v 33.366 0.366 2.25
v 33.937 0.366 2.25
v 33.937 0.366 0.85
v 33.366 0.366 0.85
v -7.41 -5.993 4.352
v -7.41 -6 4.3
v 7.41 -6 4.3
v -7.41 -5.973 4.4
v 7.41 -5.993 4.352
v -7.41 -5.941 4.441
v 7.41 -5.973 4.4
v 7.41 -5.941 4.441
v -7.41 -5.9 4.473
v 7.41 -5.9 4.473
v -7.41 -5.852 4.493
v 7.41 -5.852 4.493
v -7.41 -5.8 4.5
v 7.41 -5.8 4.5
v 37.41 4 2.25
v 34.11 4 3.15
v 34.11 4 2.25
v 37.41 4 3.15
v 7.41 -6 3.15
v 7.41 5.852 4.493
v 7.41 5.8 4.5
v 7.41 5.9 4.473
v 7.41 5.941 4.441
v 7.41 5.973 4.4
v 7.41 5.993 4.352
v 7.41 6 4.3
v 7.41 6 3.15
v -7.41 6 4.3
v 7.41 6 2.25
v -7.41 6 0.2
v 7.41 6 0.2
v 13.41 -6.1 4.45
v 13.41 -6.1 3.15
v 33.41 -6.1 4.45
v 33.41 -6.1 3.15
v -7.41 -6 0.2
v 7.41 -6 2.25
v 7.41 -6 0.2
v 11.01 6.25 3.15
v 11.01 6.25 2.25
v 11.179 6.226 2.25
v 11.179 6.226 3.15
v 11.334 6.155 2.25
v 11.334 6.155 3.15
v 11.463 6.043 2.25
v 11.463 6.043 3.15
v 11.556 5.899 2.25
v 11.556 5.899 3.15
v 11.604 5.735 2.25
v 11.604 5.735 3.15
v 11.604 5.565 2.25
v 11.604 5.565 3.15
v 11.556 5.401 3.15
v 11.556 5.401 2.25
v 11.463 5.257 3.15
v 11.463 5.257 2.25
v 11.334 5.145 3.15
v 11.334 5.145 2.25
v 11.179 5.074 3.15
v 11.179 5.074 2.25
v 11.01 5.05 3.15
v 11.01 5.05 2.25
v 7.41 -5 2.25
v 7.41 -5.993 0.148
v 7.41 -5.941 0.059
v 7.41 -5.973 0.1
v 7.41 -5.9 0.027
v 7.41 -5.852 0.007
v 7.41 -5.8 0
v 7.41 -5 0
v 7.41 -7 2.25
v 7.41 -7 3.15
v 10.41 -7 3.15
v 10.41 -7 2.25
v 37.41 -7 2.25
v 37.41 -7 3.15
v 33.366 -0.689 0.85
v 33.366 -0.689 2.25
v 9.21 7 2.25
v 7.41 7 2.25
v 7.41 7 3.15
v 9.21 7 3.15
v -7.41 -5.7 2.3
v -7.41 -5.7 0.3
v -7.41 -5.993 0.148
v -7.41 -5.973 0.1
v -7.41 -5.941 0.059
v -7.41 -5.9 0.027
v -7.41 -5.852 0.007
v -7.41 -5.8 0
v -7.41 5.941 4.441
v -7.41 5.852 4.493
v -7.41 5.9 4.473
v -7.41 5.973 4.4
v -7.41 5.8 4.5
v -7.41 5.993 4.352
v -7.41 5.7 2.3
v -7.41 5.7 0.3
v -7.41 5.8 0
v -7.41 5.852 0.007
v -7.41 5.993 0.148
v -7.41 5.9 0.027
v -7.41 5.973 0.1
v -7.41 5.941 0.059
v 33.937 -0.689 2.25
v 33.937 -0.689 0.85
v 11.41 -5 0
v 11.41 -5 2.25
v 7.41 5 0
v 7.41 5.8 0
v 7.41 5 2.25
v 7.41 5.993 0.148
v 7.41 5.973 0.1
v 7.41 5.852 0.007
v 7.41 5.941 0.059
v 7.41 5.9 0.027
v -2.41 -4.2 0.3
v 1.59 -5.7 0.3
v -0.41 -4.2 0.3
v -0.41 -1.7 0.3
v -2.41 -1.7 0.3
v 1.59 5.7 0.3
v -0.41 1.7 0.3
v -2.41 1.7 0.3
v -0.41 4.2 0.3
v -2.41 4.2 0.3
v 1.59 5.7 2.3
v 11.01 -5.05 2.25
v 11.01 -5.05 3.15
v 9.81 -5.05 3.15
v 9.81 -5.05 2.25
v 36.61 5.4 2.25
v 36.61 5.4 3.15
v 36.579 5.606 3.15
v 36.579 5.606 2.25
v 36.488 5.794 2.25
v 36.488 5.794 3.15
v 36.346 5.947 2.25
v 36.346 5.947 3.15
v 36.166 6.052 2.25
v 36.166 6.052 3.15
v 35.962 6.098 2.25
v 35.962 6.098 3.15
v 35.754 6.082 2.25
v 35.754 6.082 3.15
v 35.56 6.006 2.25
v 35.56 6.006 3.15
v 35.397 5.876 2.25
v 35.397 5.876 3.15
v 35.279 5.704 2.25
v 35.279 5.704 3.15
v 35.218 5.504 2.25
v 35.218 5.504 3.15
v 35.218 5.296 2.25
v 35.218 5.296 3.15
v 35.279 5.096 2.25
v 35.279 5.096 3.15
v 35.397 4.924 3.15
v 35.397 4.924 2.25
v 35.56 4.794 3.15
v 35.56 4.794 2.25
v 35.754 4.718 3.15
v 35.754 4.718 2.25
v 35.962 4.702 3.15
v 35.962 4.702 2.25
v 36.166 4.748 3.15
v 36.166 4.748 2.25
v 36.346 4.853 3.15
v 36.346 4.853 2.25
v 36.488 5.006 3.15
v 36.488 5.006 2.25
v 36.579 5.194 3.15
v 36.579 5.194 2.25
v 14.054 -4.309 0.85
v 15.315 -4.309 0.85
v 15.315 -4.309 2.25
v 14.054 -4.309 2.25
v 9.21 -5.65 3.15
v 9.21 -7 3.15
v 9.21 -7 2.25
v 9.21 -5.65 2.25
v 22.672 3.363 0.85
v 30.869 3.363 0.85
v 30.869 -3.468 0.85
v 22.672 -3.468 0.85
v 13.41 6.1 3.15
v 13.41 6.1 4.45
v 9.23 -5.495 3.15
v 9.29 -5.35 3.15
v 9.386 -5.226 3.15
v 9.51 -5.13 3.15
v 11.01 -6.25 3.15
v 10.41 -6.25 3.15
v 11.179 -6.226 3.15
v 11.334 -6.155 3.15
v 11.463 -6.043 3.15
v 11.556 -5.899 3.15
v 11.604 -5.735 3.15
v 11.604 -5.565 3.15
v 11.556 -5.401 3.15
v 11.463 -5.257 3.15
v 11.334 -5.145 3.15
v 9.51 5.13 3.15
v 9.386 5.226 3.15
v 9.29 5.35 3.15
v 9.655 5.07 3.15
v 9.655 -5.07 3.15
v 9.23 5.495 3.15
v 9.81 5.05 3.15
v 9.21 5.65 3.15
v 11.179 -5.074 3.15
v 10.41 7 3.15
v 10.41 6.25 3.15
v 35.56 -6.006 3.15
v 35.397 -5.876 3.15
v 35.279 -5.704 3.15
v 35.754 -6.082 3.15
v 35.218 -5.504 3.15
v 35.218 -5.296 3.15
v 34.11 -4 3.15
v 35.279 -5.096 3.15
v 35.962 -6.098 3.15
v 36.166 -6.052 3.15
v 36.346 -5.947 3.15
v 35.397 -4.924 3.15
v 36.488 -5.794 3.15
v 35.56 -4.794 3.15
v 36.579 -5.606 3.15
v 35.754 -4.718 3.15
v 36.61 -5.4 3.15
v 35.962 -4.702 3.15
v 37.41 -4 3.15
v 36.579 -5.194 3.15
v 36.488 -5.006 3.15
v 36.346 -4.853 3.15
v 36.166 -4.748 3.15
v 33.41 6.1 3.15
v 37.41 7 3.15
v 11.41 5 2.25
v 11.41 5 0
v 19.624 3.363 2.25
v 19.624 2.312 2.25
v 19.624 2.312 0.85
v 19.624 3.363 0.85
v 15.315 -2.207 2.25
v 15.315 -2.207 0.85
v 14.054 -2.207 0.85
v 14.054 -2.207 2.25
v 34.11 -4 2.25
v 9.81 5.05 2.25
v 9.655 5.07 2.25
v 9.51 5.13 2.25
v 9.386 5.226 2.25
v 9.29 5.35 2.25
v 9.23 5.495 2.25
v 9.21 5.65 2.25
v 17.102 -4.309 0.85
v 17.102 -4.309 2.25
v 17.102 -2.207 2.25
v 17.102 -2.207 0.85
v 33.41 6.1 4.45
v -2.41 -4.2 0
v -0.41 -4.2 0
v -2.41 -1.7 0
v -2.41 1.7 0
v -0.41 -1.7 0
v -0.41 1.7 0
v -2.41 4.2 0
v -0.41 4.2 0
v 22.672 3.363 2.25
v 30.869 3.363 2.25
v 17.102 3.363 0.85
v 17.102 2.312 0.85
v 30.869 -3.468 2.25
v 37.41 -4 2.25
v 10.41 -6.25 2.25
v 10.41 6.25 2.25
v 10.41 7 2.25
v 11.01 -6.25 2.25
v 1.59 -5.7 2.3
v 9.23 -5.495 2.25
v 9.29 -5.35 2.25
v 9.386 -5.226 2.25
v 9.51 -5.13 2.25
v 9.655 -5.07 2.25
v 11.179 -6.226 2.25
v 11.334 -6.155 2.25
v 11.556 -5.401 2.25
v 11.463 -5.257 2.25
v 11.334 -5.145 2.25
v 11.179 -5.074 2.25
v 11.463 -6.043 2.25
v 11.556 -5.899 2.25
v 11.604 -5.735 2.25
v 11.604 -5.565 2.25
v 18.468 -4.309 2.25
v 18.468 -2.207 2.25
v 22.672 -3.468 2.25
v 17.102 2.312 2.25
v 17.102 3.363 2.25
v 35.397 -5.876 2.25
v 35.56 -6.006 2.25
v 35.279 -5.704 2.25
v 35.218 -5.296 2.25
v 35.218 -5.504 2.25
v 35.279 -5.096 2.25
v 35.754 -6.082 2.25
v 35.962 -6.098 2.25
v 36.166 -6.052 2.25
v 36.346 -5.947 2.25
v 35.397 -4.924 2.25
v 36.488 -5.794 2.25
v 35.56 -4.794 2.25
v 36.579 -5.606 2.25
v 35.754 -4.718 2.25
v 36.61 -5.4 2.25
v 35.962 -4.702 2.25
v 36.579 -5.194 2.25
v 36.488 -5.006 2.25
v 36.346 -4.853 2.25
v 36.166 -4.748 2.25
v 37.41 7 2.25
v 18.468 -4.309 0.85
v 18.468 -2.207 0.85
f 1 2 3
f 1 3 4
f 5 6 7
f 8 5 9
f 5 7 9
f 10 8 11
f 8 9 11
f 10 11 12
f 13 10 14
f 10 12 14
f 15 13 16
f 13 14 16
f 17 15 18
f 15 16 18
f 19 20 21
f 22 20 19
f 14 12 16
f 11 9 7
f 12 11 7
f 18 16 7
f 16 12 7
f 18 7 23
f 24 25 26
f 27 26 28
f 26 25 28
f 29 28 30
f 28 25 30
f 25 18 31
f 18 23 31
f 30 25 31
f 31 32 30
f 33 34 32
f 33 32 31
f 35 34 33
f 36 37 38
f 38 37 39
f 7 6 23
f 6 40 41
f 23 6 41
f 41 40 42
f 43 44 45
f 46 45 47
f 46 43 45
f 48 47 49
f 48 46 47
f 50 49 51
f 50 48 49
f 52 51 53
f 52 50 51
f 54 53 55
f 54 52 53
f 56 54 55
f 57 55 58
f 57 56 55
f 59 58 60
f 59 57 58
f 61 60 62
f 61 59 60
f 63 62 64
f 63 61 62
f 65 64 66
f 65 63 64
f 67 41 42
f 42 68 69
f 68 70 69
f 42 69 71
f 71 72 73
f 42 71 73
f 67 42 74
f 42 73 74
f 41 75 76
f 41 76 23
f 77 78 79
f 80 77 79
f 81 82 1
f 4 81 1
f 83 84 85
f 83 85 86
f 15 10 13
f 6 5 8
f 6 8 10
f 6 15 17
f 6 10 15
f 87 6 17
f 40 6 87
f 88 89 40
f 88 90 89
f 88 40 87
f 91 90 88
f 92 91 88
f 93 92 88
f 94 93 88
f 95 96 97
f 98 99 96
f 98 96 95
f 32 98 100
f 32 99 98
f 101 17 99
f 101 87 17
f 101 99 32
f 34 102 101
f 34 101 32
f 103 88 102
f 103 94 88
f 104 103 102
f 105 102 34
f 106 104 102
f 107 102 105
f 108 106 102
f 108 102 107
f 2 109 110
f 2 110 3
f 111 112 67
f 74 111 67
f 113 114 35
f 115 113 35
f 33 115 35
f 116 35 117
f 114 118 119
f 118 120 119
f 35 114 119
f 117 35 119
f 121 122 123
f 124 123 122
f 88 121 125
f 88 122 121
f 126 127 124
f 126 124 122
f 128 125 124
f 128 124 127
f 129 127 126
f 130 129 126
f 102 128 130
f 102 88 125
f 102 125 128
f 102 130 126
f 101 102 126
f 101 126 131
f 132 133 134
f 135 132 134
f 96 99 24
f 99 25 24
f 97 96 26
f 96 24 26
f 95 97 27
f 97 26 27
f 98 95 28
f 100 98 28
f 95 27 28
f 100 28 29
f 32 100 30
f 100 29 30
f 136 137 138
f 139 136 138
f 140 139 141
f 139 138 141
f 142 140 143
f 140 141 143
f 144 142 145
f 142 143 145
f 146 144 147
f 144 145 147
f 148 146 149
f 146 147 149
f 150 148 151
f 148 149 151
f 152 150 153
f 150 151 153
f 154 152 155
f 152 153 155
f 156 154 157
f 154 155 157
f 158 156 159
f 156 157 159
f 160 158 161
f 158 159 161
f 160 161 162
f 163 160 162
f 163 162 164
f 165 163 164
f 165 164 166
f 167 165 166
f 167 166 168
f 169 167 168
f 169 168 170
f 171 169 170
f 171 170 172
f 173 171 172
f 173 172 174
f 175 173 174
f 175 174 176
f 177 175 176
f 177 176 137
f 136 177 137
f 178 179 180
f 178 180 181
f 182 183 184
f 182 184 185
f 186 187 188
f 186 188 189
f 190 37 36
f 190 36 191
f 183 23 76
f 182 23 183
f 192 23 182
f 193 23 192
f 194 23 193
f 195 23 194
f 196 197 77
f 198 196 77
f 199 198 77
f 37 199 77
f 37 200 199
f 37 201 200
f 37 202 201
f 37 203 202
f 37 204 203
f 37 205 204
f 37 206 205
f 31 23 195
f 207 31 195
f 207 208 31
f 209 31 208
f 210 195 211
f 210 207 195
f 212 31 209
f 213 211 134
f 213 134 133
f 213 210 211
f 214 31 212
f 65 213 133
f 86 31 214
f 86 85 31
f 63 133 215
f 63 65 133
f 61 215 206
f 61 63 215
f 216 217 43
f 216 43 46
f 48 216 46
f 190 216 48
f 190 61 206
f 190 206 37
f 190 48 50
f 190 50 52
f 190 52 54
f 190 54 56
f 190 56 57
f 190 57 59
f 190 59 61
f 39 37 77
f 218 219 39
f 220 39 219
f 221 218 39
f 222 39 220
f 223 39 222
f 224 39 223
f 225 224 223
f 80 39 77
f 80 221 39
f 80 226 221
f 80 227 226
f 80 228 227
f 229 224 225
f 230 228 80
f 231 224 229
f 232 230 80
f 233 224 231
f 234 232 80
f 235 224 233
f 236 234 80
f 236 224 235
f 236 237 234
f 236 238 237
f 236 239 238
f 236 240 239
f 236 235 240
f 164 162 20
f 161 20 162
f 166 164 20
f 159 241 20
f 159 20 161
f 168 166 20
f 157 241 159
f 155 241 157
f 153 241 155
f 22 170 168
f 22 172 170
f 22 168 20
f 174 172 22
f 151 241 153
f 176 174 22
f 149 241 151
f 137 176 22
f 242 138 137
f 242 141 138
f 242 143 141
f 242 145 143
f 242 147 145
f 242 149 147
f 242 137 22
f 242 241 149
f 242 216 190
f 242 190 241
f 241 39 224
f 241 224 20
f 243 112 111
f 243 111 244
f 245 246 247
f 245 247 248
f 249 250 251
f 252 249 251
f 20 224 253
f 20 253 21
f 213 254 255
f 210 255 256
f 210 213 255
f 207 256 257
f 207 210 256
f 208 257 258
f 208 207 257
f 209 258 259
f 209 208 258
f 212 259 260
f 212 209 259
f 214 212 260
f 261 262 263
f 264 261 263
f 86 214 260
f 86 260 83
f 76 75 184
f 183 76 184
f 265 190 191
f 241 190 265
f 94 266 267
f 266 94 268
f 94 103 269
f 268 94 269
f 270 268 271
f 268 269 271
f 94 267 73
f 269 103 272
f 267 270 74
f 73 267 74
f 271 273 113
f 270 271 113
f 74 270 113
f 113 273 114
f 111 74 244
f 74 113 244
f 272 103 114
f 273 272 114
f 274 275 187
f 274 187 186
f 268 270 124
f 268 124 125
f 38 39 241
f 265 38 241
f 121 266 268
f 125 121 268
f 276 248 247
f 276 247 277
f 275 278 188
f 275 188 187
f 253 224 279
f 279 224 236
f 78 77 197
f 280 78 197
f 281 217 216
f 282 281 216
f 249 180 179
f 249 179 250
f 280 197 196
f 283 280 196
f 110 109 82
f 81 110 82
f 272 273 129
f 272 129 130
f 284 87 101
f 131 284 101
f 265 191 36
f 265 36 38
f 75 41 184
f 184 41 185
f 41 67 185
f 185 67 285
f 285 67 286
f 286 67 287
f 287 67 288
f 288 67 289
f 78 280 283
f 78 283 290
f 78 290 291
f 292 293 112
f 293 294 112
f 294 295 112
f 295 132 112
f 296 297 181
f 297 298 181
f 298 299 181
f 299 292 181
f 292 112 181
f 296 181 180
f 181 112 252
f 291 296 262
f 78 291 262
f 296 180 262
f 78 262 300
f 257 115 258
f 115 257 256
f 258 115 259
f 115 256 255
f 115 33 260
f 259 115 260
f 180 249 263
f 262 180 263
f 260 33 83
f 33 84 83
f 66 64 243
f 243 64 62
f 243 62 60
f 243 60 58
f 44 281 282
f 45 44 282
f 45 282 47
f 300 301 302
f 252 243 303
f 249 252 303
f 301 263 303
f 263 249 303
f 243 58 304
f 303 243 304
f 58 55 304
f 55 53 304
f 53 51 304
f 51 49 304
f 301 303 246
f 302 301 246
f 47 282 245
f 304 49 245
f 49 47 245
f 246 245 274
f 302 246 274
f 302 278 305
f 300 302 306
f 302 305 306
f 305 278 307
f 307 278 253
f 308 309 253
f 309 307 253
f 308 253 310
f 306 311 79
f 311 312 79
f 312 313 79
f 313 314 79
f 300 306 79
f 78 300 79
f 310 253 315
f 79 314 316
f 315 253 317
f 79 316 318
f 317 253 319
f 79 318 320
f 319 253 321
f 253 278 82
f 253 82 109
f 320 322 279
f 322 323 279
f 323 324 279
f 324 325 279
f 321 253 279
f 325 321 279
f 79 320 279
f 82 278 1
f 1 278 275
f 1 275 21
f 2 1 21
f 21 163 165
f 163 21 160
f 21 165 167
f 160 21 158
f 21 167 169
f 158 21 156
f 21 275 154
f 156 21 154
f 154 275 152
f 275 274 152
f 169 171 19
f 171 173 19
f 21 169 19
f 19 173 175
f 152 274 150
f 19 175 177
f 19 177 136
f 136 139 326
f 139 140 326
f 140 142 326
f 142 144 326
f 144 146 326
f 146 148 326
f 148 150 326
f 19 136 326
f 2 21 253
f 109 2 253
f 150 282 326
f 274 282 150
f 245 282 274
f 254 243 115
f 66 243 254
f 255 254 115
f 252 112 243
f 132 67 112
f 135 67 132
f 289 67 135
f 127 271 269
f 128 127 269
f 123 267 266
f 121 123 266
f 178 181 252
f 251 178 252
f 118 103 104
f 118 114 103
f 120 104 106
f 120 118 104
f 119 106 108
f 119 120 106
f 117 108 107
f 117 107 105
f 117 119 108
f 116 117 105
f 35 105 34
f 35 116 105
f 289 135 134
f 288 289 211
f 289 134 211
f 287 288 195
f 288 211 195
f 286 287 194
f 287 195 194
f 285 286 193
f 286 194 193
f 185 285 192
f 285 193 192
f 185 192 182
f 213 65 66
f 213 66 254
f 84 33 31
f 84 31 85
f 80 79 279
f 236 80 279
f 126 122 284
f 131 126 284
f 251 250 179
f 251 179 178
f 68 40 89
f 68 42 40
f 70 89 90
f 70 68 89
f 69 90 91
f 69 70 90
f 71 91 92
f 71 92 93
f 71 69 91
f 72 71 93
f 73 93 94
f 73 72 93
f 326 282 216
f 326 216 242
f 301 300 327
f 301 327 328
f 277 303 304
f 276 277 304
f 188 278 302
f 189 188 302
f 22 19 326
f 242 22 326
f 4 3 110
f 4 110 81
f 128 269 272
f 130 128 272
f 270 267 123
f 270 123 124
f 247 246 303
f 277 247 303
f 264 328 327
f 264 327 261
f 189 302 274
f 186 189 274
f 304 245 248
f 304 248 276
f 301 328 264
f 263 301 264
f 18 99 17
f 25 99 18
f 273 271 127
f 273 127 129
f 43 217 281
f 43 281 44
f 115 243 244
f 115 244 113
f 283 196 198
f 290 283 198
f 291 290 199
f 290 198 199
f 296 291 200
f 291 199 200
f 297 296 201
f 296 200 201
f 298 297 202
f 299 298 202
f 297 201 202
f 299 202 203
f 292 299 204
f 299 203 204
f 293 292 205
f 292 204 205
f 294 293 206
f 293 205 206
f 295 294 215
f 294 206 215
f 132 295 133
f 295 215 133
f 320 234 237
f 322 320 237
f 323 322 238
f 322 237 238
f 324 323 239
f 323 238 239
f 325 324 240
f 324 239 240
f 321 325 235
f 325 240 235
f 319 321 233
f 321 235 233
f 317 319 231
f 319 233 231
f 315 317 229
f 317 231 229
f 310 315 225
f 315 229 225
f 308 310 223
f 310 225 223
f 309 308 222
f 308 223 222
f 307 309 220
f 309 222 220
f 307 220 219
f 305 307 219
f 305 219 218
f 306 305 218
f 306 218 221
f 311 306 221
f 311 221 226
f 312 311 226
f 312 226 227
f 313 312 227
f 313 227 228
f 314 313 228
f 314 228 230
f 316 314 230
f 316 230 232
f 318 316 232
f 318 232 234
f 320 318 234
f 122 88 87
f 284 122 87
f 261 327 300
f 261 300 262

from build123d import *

# Parameters (mm, degrees)
ESQUISSE1_W             = 14.82
ESQUISSE1_H             = 12
BOSS_EXTRU_1_DEPTH      = 4.5
ESQUISSE2_W             = 2
ESQUISSE2_H             = 11.4
ENL_V_MAT_EXTRU_1_DEPTH = 9
CONG_1_R                = 0.2
ESQUISSE3_W             = 30
ESQUISSE3_H             = 14
BOSS_EXTRU_2_DEPTH      = 0.9
ENL_V_MAT_EXTRU_2_REACH = 6.5
ESQUISSE4_W             = 2
ESQUISSE4_H             = 2.5
ESQUISSE5_R             = 0.7
ESQUISSE5_W             = 3.3
ESQUISSE5_H             = 8
ENL_V_MAT_EXTRU_3_DEPTH = 4.15
ESQUISSE6_W             = 20
ESQUISSE6_H             = 12.2
BOSS_EXTRU_3_DEPTH      = 1.3
ESQUISSE7_W             = 8.197434371
ESQUISSE7_H             = 6.831195309
ESQUISSE7_W_2           = 1.366239062
ESQUISSE7_H_2           = 2.101906249
ESQUISSE7_W_3           = 1.261143749
ESQUISSE7_W_4           = 2.522287499
ESQUISSE7_H_3           = 1.050953124
ESQUISSE7_W_5           = 0.570374351
ESQUISSE7_H_4           = 1.05519255
BOSS_EXTRU_4_DEPTH      = 1.4
ESQUISSE8_W             = 4
ESQUISSE8_H             = 10
BOSS_EXTRU_5_DEPTH      = 2.25
ESQUISSE9_W             = 1.2
ESQUISSE9_H             = 1.35
ENL_V_MAT_EXTRU_4_DEPTH = 4.15


with BuildPart() as part:
    # Esquisse1 → Boss.-Extru.1 (new body)
    with BuildSketch(Plane.XY):
        Rectangle(ESQUISSE1_W, ESQUISSE1_H)
    extrude(amount=BOSS_EXTRU_1_DEPTH)

    # Esquisse2 → Enlèv. mat.-Extru.1 (cut)
    with BuildSketch(Plane.ZY.offset(7.41)):
        with Locations((1.3, 0)):
            Rectangle(ESQUISSE2_W, ESQUISSE2_H)
    extrude(amount=-ENL_V_MAT_EXTRU_1_DEPTH, mode=Mode.SUBTRACT)

    # Congé1
    cong_1_edges = [part.edges().sort_by_distance(p)[0] for p in [
        (0, -6, 4.5),
        (0, -6, 0),
        (0, 6, 0),
        (0, 6, 4.5),
    ]]
    fillet(cong_1_edges, radius=CONG_1_R)

    # Esquisse3 → Boss.-Extru.2 (add)
    with BuildSketch(Plane.XY.offset(2.25)):
        with Locations((22.41, 0)):
            Rectangle(ESQUISSE3_W, ESQUISSE3_H)
    extrude(amount=BOSS_EXTRU_2_DEPTH)

    # Esquisse4 → Enlèv. mat.-Extru.2 (cut, up to next)
    with BuildSketch(Plane(origin=(0, 0, 0), x_dir=(-1, 0, 0), z_dir=(0, 0, -1)), mode=Mode.PRIVATE) as enl_v_mat_extru_2_sk1:
        with Locations((1.41, 2.95)):
            Rectangle(ESQUISSE4_W, ESQUISSE4_H)
    enl_v_mat_extru_2_tool1 = extrude(enl_v_mat_extru_2_sk1.sketch, amount=-ENL_V_MAT_EXTRU_2_REACH, mode=Mode.PRIVATE) & part.part
    add(enl_v_mat_extru_2_tool1.solids().sort_by_distance((-1.41, 2.95, 0))[0], mode=Mode.SUBTRACT)
    # Esquisse4 → Enlèv. mat.-Extru.2 (cut, up to next)
    with BuildSketch(Plane(origin=(0, 0, 0), x_dir=(-1, 0, 0), z_dir=(0, 0, -1)), mode=Mode.PRIVATE) as enl_v_mat_extru_2_sk2:
        with Locations((1.41, -2.95)):
            Rectangle(ESQUISSE4_W, ESQUISSE4_H)
    enl_v_mat_extru_2_tool2 = extrude(enl_v_mat_extru_2_sk2.sketch, amount=-ENL_V_MAT_EXTRU_2_REACH, mode=Mode.PRIVATE) & part.part
    add(enl_v_mat_extru_2_tool2.solids().sort_by_distance((-1.41, -2.95, 0))[0], mode=Mode.SUBTRACT)

    # Esquisse5 → Enlèv. mat.-Extru.3 (cut, through all)
    with BuildSketch(Plane.XY.offset(3.15)):
        with Locations((35.91, 5.4)):
            Circle(ESQUISSE5_R)
        with Locations((35.91, -5.4)):
            Circle(ESQUISSE5_R)
        with Locations((35.76, 0)):
            Rectangle(ESQUISSE5_W, ESQUISSE5_H)
        with BuildLine():
            Line((9.81, 6.25), (11.01, 6.25))
            ThreePointArc((11.01, 6.25), (11.61, 5.65), (11.01, 5.05))
            Line((11.01, 5.05), (9.81, 5.05))
            ThreePointArc((9.81, 5.05), (9.21, 5.65), (9.81, 6.25))
        make_face()
        with BuildLine():
            Line((9.81, -6.25), (11.01, -6.25))
            ThreePointArc((11.01, -6.25), (11.61, -5.65), (11.01, -5.05))
            Line((11.01, -5.05), (9.81, -5.05))
            ThreePointArc((9.81, -5.05), (9.21, -5.65), (9.81, -6.25))
        make_face()
    extrude(amount=-ENL_V_MAT_EXTRU_3_DEPTH, mode=Mode.SUBTRACT)

    # Esquisse6 → Boss.-Extru.3 (add)
    with BuildSketch(Plane.XY.offset(3.15)):
        with Locations((23.41, 0)):
            Rectangle(ESQUISSE6_W, ESQUISSE6_H)
    extrude(amount=BOSS_EXTRU_3_DEPTH)

    # Esquisse7 → Boss.-Extru.4 (add)
    with BuildSketch(Plane(origin=(0, 0, 2.25), x_dir=(-1, 0, 0), z_dir=(0, 0, -1))):
        with Locations((-26.770674994, -0.052547657)):
            Rectangle(ESQUISSE7_W, ESQUISSE7_H)
        with Locations((-17.78502578, -3.257954686)):
            Rectangle(ESQUISSE7_W_2, ESQUISSE7_H_2)
        with Locations((-14.684714062, -3.257954686)):
            Rectangle(ESQUISSE7_W_3, ESQUISSE7_H_2)
        with Locations((-18.363049999, 2.837573436)):
            Rectangle(ESQUISSE7_W_4, ESQUISSE7_H_3)
        with Locations((-33.651427146, -0.16121887)):
            Rectangle(ESQUISSE7_W_5, ESQUISSE7_H_4)
    extrude(amount=BOSS_EXTRU_4_DEPTH)

    # Esquisse8 → Boss.-Extru.5 (add)
    with BuildSketch(Plane(origin=(0, 0, 2.25), x_dir=(-1, 0, 0), z_dir=(0, 0, -1))):
        with Locations((-9.41, 0)):
            Rectangle(ESQUISSE8_W, ESQUISSE8_H)
    extrude(amount=BOSS_EXTRU_5_DEPTH)

    # Esquisse9 → Enlèv. mat.-Extru.4 (cut, through all)
    with BuildSketch(Plane.XY.offset(3.15)):
        with Locations((9.81, 6.325)):
            Rectangle(ESQUISSE9_W, ESQUISSE9_H)
        with Locations((9.81, -6.325)):
            Rectangle(ESQUISSE9_W, ESQUISSE9_H)
    extrude(amount=-ENL_V_MAT_EXTRU_4_DEPTH, mode=Mode.SUBTRACT)


solid = part.part
